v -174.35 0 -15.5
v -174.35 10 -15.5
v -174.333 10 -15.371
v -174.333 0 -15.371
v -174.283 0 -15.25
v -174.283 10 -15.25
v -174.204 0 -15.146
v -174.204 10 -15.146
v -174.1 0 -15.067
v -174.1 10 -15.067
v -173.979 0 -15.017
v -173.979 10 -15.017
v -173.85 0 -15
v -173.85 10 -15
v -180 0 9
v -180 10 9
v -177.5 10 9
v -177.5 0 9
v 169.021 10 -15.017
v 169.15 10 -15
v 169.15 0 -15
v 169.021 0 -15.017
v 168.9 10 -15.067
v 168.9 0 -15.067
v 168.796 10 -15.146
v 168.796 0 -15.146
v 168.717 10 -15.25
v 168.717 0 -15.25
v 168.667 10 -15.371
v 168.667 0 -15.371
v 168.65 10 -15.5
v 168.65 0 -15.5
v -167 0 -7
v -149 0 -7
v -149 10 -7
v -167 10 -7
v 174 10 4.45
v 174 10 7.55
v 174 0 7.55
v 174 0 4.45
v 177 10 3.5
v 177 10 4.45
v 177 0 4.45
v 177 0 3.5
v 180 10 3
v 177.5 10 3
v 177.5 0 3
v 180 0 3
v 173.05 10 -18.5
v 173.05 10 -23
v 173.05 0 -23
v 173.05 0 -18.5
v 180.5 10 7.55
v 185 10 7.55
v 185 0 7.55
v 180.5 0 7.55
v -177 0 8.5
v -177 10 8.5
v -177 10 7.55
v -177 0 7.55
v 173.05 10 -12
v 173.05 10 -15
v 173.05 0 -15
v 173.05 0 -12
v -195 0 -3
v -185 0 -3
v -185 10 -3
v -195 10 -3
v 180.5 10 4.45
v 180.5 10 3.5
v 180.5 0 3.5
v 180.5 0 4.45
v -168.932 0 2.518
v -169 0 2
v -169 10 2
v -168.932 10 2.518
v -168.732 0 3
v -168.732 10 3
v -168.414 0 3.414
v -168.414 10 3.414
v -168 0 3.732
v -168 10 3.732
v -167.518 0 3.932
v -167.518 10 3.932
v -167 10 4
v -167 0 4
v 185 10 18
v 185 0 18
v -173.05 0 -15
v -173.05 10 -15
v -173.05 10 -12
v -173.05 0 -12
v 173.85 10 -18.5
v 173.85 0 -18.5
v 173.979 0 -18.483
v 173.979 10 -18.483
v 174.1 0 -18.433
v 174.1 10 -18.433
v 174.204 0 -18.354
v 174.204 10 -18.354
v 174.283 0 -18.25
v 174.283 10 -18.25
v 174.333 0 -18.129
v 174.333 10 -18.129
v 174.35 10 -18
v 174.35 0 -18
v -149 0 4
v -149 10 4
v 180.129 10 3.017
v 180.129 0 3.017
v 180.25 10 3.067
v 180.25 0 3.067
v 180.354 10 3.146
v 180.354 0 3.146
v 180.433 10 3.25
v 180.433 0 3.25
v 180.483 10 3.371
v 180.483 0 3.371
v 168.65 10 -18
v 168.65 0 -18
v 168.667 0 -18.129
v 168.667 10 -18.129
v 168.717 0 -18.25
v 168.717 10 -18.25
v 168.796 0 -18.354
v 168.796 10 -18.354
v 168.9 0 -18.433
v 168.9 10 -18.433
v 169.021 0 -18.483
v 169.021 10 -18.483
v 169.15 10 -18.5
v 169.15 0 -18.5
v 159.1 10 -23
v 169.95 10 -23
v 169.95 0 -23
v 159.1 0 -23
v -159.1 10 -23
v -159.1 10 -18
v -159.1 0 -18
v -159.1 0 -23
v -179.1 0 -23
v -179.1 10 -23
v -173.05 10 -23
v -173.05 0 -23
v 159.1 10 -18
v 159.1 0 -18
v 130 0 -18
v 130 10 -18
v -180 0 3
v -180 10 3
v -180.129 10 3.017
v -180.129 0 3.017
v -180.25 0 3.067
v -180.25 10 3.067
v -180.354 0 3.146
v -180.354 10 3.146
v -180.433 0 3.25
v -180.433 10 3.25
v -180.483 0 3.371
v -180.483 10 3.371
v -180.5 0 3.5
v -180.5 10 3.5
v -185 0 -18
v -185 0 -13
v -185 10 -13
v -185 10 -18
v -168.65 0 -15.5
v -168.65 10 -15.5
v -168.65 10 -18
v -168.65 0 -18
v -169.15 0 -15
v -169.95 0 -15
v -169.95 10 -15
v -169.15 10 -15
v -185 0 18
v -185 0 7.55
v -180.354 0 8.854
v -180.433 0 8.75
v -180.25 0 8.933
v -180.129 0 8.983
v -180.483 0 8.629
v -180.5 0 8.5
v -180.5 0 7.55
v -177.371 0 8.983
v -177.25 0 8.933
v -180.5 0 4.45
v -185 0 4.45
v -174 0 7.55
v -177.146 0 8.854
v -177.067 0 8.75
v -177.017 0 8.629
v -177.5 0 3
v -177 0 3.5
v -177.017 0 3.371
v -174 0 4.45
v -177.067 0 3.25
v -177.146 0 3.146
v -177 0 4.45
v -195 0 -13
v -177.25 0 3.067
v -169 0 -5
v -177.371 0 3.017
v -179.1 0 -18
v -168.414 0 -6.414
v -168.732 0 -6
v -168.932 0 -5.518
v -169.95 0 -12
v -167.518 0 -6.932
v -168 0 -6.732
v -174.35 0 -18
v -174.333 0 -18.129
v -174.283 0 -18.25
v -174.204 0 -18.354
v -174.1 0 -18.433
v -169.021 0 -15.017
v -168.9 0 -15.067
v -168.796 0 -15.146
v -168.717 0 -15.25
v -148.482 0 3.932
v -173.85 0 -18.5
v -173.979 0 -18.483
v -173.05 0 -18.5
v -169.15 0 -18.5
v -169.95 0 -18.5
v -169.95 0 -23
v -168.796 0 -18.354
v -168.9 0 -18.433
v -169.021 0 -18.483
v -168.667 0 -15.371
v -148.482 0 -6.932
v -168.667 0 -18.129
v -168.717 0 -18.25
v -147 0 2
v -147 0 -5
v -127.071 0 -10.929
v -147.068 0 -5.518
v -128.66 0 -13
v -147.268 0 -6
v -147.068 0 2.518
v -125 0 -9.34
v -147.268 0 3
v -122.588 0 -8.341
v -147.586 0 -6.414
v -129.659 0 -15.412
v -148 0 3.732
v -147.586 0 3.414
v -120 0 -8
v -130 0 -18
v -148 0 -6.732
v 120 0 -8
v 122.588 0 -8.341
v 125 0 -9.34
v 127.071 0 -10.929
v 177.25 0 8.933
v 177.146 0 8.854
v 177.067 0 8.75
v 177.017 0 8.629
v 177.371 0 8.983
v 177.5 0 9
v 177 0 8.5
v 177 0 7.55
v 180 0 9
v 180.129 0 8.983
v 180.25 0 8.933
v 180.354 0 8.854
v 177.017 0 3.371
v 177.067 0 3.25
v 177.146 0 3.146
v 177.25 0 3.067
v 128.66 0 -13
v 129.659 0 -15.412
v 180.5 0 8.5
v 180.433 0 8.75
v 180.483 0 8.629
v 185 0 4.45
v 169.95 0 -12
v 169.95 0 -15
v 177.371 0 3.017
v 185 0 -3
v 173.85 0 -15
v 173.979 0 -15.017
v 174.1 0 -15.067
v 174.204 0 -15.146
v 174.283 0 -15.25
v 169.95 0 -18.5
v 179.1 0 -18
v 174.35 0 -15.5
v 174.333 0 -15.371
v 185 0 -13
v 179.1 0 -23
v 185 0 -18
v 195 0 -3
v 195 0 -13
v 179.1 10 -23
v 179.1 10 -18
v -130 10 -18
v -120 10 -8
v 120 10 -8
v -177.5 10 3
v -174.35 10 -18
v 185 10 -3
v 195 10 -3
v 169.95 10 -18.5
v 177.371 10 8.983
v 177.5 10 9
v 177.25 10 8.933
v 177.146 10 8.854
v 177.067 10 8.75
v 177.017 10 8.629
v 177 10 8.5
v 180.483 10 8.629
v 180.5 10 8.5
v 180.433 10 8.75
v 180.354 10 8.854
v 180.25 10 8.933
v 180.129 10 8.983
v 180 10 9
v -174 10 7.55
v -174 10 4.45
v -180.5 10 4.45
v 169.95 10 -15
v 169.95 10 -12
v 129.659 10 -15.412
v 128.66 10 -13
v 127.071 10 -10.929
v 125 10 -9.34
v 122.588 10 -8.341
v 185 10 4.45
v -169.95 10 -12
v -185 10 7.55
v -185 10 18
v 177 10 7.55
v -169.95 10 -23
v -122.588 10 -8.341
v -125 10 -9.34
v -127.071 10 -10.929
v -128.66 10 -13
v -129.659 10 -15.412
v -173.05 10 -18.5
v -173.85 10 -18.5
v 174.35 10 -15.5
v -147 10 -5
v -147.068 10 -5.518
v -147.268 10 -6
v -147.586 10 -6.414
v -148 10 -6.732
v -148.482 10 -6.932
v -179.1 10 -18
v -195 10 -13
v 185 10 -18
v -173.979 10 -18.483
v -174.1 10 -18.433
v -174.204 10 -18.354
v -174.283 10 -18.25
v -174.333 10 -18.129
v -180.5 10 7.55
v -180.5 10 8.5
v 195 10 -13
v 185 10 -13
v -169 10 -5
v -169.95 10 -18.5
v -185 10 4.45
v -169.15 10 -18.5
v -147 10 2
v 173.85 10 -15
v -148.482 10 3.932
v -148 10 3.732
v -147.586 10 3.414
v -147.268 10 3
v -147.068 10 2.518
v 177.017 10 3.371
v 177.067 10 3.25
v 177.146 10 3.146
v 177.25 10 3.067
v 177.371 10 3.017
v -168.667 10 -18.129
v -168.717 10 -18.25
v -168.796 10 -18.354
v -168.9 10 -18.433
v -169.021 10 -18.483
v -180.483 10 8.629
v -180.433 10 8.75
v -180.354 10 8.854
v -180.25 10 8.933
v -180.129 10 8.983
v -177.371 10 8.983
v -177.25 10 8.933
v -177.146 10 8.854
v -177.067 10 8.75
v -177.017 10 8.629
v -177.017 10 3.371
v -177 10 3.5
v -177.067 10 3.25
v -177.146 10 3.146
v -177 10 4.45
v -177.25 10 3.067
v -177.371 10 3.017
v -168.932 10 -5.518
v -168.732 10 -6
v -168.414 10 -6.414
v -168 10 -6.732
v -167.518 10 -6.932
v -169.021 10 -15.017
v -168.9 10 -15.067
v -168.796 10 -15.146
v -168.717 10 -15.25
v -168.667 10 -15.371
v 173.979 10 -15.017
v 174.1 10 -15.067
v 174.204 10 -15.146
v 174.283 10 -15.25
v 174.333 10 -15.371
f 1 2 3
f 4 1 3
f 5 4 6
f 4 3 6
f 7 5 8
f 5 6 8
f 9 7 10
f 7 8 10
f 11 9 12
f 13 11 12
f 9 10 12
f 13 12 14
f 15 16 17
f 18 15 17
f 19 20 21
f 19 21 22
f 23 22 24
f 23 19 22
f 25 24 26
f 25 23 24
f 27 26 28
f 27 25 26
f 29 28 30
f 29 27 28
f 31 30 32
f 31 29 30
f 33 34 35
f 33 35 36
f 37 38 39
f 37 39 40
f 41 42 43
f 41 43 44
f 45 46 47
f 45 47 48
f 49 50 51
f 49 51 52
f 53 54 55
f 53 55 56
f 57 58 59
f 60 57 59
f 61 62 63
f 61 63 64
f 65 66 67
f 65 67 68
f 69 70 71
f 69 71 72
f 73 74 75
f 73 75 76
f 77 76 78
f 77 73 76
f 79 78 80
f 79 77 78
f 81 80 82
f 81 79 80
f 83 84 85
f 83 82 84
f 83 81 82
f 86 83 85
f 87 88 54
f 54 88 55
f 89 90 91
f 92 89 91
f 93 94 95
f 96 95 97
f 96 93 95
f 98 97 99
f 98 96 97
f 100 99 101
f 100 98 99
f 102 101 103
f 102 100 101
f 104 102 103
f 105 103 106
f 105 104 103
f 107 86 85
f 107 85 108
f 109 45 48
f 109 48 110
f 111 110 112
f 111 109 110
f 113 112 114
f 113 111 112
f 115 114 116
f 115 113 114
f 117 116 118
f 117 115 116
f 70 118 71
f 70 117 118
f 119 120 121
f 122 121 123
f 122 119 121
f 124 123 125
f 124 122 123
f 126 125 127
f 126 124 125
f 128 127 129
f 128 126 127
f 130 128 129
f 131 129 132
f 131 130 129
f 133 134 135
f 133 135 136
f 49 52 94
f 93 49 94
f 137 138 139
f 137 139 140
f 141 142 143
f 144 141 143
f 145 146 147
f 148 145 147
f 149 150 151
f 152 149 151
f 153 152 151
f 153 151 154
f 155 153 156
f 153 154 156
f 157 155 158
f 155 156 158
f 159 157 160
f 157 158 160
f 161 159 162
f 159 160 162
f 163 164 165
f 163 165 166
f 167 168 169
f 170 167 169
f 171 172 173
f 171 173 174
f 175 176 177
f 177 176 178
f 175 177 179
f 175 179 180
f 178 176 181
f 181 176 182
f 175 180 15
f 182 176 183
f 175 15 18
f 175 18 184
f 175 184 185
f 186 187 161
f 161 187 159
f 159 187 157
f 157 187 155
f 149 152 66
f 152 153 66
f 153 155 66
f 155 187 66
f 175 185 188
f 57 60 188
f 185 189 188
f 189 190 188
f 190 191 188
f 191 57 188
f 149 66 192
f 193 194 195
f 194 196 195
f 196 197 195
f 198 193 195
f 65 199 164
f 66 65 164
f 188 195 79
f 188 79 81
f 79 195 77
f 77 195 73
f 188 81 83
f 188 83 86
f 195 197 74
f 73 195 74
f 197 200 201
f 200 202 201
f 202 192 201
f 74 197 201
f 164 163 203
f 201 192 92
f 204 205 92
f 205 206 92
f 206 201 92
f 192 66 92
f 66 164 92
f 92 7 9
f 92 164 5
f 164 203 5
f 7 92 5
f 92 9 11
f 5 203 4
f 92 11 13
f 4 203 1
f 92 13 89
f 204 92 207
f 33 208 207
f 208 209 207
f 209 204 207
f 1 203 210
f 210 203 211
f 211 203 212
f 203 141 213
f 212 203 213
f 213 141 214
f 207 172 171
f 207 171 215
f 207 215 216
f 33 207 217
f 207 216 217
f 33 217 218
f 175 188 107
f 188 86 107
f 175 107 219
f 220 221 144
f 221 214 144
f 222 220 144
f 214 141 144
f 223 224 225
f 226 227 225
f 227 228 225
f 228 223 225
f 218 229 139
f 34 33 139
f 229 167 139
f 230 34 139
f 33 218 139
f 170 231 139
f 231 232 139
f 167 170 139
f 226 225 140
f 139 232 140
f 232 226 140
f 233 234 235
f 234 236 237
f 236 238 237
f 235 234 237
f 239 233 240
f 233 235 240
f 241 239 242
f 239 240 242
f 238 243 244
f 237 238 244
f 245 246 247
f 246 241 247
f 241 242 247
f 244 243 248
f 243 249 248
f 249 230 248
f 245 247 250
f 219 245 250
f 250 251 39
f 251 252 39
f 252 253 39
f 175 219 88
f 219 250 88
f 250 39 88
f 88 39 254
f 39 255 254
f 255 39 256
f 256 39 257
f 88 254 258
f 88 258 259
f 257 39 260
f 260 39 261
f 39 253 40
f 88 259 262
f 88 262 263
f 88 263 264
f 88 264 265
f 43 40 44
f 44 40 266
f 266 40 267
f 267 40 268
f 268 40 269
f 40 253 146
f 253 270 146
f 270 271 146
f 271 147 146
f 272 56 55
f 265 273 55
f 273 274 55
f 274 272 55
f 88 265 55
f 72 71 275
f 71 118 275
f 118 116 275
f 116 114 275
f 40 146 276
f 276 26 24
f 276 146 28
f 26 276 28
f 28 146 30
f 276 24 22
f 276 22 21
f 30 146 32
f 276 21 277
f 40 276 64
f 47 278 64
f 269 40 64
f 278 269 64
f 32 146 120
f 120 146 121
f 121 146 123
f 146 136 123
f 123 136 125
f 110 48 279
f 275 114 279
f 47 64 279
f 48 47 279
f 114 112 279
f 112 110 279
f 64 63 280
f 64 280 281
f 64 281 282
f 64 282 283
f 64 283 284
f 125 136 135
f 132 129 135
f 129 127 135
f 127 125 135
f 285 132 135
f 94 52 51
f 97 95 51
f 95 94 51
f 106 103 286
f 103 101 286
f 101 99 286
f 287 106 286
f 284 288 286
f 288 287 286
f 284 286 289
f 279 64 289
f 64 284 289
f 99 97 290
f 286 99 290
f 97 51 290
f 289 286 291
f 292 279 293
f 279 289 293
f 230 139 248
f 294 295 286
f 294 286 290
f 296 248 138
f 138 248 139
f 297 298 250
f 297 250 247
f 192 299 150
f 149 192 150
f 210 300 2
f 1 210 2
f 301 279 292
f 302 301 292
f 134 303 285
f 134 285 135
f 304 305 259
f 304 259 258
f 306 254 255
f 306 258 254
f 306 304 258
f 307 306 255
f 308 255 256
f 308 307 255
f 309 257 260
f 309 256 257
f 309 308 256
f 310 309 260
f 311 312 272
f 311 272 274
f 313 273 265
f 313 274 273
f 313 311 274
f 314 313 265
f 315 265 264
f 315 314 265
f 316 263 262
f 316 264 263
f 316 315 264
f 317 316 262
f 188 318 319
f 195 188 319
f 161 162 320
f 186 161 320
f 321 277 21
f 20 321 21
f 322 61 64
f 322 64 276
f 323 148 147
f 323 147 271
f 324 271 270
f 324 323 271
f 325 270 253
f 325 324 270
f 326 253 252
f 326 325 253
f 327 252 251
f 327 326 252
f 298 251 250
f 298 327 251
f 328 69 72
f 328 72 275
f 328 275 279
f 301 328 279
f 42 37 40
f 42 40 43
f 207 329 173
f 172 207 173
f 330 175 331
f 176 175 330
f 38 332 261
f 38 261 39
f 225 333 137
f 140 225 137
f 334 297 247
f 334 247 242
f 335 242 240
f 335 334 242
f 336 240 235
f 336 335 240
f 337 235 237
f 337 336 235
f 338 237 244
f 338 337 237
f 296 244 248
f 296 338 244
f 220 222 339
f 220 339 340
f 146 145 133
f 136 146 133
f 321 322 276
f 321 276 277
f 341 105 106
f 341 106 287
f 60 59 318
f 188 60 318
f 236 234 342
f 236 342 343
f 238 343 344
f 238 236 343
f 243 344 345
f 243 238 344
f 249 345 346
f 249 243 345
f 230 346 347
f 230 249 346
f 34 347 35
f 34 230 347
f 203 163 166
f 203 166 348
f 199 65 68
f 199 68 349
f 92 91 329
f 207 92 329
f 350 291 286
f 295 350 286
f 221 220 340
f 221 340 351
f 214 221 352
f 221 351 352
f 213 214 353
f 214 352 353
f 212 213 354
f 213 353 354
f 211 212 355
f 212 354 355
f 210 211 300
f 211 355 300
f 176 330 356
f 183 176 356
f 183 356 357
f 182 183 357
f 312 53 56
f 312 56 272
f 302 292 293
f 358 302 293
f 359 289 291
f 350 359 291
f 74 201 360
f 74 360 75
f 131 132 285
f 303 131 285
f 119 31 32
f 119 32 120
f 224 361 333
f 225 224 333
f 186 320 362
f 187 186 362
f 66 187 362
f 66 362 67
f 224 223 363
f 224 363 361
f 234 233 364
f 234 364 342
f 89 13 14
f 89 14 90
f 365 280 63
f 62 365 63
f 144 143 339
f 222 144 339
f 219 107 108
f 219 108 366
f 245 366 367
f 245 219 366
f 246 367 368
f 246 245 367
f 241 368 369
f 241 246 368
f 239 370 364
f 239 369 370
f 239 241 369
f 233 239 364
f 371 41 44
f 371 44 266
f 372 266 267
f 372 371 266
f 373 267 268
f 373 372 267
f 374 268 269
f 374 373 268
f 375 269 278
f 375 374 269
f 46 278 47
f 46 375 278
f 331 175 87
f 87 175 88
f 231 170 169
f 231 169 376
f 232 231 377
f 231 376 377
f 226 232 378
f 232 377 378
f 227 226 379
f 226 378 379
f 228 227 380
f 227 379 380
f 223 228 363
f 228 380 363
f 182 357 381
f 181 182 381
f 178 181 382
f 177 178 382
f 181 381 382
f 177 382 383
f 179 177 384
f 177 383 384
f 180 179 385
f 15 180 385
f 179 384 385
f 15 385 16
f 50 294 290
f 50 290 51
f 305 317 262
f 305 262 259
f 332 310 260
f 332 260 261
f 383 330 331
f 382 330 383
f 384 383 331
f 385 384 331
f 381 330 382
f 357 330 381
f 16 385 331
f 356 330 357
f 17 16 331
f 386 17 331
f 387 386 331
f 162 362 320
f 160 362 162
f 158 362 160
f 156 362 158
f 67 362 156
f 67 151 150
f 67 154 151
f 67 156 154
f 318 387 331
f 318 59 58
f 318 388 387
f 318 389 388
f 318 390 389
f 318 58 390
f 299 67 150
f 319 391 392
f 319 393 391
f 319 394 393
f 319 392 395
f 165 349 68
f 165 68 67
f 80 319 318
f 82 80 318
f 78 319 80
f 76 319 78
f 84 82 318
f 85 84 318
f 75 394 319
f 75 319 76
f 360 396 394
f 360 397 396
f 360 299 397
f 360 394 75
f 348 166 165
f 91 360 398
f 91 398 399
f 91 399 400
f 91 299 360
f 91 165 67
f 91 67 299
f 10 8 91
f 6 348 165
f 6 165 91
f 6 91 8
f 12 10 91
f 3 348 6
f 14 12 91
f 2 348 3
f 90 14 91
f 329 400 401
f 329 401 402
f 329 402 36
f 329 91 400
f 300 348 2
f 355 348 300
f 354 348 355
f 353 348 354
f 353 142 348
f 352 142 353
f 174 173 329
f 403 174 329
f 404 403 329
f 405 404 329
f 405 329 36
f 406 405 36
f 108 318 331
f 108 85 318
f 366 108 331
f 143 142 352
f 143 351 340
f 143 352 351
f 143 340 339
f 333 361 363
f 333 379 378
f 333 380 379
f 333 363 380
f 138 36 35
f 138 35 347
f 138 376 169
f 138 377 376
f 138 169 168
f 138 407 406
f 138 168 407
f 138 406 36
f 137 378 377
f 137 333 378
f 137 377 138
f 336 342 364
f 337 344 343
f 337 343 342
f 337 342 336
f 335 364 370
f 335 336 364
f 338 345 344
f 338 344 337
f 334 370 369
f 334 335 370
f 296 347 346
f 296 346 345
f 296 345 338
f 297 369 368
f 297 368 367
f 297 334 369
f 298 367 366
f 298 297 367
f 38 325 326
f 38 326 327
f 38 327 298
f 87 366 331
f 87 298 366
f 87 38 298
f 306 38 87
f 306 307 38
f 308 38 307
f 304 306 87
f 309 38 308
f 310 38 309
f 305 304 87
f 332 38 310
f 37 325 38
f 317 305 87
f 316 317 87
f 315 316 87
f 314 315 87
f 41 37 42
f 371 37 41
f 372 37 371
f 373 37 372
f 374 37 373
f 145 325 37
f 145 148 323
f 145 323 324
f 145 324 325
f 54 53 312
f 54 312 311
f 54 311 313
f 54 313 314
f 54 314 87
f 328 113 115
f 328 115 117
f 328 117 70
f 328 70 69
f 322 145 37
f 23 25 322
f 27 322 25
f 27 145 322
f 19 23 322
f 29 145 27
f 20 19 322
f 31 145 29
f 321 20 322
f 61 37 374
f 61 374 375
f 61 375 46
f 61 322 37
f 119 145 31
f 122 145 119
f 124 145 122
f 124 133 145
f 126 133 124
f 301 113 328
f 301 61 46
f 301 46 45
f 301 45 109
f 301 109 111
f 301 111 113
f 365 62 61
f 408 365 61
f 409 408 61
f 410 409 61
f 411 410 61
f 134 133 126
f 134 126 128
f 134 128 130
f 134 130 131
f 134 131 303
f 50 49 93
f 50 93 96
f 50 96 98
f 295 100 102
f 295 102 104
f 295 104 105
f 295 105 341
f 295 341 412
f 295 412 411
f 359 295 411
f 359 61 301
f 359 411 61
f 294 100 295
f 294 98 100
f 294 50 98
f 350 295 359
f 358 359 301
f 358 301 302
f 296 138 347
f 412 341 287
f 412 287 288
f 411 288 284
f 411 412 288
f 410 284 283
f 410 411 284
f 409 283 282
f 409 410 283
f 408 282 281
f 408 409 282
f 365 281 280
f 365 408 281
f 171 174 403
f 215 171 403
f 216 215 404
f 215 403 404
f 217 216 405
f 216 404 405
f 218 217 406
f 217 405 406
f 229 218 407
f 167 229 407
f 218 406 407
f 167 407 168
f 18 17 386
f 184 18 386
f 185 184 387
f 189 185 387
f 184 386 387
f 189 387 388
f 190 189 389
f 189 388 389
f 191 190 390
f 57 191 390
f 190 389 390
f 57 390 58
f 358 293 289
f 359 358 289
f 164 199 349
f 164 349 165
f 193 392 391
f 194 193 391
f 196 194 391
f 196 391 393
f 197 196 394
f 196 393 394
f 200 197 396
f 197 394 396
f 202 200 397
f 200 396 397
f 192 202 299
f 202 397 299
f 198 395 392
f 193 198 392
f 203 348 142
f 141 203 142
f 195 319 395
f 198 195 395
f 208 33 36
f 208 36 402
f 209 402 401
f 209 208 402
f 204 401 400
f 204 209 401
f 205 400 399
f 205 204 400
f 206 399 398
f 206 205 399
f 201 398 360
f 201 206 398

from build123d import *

# Parameters (mm, degrees)
MAINSHAPE_DEPTH      = 10
SKETCH15_W           = 20
SKETCH15_H           = 10
BOSS_EXTRUDE4_DEPTH  = 10
SCREWSLOTS_DEPTH     = 197.606205395
LCDCABLECUTOUT_DEPTH = 197.606205395
CUT_EXTRUDE5_DEPTH   = 197.606205395


with BuildPart() as part:
    # Sketch1 → MainShape (new body)
    with BuildSketch(Plane(origin=(0, 0, 0), x_dir=(1, 0, 0), z_dir=(0, 1, 0))):
        Polygon((-185, 18), (0, 18), (0, -18), (-185, -18), (-185, 3), (-195, 3), (-195, 13), (-185, 13), align=None)
    mainshape = extrude(amount=MAINSHAPE_DEPTH)

    # Sketch15 → Boss-Extrude4 (add, through all)
    with BuildSketch(Plane(origin=(0, 10, 0), x_dir=(1, 0, 0), z_dir=(0, 1, 0))):
        with Locations((-169.1, 18)):
            Rectangle(SKETCH15_W, SKETCH15_H)
    boss_extrude4 = extrude(amount=-BOSS_EXTRUDE4_DEPTH)

    # Sketch2 → ScrewSlots (cut, through all)
    with BuildSketch(Plane(origin=(0, 10, 0), x_dir=(1, 0, 0), z_dir=(0, 1, 0))):
        with BuildLine():
            Line((-173.05, 23), (-173.05, 18.5))
            Line((-173.05, 18.5), (-173.85, 18.5))
            ThreePointArc((-173.85, 18.5), (-174.203553391, 18.353553391), (-174.35, 18))
            Line((-174.35, 18), (-174.35, 15.5))
            ThreePointArc((-174.35, 15.5), (-174.203553391, 15.146446609), (-173.85, 15))
            Line((-173.85, 15), (-173.05, 15))
            Line((-173.05, 15), (-173.05, 12))
            Line((-173.05, 12), (-169.95, 12))
            Line((-169.95, 12), (-169.95, 15))
            Line((-169.95, 15), (-169.15, 15))
            ThreePointArc((-169.15, 15), (-168.796446609, 15.146446609), (-168.65, 15.5))
            Line((-168.65, 15.5), (-168.65, 18))
            ThreePointArc((-168.65, 18), (-168.796446609, 18.353553391), (-169.15, 18.5))
            Line((-169.15, 18.5), (-169.95, 18.5))
            Line((-169.95, 18.5), (-169.95, 23))
            Line((-169.95, 23), (-173.05, 23))
        make_face()
        with BuildLine():
            Line((-174, -7.55), (-174, -4.45))
            Line((-174, -4.45), (-177, -4.45))
            Line((-177, -4.45), (-177, -3.5))
            ThreePointArc((-177, -3.5), (-177.146446609, -3.146446609), (-177.5, -3))
            Line((-177.5, -3), (-180, -3))
            ThreePointArc((-180, -3), (-180.353553391, -3.146446609), (-180.5, -3.5))
            Line((-180.5, -3.5), (-180.5, -4.45))
            Line((-180.5, -4.45), (-185, -4.45))
            Line((-185, -4.45), (-185, -7.55))
            Line((-185, -7.55), (-180.5, -7.55))
            Line((-180.5, -7.55), (-180.5, -8.5))
            ThreePointArc((-180.5, -8.5), (-180.353553391, -8.853553391), (-180, -9))
            Line((-180, -9), (-177.5, -9))
            ThreePointArc((-177.5, -9), (-177.146446609, -8.853553391), (-177, -8.5))
            Line((-177, -8.5), (-177, -7.55))
            Line((-177, -7.55), (-174, -7.55))
        make_face()
    screwslots = extrude(amount=-SCREWSLOTS_DEPTH, mode=Mode.SUBTRACT)

    # Mirror1: MainShape, Boss-Extrude4, ScrewSlots across plane
    add(mainshape.mirror(Plane(origin=(0, 0, 0), x_dir=(0, 0, 1), z_dir=(1, 0, 0))))
    add(boss_extrude4.mirror(Plane(origin=(0, 0, 0), x_dir=(0, 0, 1), z_dir=(1, 0, 0))))
    add(screwslots.mirror(Plane(origin=(0, 0, 0), x_dir=(0, 0, 1), z_dir=(1, 0, 0))), mode=Mode.SUBTRACT)

    # Sketch11 → LCDCableCutout (cut, through all)
    with BuildSketch(Plane.XZ):
        with BuildLine():
            Line((-149, -7), (-167, -7))
            ThreePointArc((-167, -7), (-168.414213562, -6.414213562), (-169, -5))
            Line((-169, -5), (-169, 2))
            ThreePointArc((-169, 2), (-168.414213562, 3.414213562), (-167, 4))
            Line((-167, 4), (-149, 4))
            ThreePointArc((-149, 4), (-147.585786438, 3.414213562), (-147, 2))
            Line((-147, 2), (-147, -5))
            ThreePointArc((-147, -5), (-147.585786438, -6.414213562), (-149, -7))
        make_face()
    extrude(amount=-LCDCABLECUTOUT_DEPTH, mode=Mode.SUBTRACT)

    # Sketch13 → Cut-Extrude5 (cut, through all)
    with BuildSketch(Plane(origin=(0, 10, 0), x_dir=(1, 0, 0), z_dir=(0, 1, 0))):
        with BuildLine():
            Line((120, 8), (-120, 8))
            ThreePointArc((-120, 8), (-130, 18), (-120, 28))
            Line((-120, 28), (120, 28))
            ThreePointArc((120, 28), (130, 18), (120, 8))
        make_face()
    extrude(amount=-CUT_EXTRUDE5_DEPTH, mode=Mode.SUBTRACT)


solid = part.part
